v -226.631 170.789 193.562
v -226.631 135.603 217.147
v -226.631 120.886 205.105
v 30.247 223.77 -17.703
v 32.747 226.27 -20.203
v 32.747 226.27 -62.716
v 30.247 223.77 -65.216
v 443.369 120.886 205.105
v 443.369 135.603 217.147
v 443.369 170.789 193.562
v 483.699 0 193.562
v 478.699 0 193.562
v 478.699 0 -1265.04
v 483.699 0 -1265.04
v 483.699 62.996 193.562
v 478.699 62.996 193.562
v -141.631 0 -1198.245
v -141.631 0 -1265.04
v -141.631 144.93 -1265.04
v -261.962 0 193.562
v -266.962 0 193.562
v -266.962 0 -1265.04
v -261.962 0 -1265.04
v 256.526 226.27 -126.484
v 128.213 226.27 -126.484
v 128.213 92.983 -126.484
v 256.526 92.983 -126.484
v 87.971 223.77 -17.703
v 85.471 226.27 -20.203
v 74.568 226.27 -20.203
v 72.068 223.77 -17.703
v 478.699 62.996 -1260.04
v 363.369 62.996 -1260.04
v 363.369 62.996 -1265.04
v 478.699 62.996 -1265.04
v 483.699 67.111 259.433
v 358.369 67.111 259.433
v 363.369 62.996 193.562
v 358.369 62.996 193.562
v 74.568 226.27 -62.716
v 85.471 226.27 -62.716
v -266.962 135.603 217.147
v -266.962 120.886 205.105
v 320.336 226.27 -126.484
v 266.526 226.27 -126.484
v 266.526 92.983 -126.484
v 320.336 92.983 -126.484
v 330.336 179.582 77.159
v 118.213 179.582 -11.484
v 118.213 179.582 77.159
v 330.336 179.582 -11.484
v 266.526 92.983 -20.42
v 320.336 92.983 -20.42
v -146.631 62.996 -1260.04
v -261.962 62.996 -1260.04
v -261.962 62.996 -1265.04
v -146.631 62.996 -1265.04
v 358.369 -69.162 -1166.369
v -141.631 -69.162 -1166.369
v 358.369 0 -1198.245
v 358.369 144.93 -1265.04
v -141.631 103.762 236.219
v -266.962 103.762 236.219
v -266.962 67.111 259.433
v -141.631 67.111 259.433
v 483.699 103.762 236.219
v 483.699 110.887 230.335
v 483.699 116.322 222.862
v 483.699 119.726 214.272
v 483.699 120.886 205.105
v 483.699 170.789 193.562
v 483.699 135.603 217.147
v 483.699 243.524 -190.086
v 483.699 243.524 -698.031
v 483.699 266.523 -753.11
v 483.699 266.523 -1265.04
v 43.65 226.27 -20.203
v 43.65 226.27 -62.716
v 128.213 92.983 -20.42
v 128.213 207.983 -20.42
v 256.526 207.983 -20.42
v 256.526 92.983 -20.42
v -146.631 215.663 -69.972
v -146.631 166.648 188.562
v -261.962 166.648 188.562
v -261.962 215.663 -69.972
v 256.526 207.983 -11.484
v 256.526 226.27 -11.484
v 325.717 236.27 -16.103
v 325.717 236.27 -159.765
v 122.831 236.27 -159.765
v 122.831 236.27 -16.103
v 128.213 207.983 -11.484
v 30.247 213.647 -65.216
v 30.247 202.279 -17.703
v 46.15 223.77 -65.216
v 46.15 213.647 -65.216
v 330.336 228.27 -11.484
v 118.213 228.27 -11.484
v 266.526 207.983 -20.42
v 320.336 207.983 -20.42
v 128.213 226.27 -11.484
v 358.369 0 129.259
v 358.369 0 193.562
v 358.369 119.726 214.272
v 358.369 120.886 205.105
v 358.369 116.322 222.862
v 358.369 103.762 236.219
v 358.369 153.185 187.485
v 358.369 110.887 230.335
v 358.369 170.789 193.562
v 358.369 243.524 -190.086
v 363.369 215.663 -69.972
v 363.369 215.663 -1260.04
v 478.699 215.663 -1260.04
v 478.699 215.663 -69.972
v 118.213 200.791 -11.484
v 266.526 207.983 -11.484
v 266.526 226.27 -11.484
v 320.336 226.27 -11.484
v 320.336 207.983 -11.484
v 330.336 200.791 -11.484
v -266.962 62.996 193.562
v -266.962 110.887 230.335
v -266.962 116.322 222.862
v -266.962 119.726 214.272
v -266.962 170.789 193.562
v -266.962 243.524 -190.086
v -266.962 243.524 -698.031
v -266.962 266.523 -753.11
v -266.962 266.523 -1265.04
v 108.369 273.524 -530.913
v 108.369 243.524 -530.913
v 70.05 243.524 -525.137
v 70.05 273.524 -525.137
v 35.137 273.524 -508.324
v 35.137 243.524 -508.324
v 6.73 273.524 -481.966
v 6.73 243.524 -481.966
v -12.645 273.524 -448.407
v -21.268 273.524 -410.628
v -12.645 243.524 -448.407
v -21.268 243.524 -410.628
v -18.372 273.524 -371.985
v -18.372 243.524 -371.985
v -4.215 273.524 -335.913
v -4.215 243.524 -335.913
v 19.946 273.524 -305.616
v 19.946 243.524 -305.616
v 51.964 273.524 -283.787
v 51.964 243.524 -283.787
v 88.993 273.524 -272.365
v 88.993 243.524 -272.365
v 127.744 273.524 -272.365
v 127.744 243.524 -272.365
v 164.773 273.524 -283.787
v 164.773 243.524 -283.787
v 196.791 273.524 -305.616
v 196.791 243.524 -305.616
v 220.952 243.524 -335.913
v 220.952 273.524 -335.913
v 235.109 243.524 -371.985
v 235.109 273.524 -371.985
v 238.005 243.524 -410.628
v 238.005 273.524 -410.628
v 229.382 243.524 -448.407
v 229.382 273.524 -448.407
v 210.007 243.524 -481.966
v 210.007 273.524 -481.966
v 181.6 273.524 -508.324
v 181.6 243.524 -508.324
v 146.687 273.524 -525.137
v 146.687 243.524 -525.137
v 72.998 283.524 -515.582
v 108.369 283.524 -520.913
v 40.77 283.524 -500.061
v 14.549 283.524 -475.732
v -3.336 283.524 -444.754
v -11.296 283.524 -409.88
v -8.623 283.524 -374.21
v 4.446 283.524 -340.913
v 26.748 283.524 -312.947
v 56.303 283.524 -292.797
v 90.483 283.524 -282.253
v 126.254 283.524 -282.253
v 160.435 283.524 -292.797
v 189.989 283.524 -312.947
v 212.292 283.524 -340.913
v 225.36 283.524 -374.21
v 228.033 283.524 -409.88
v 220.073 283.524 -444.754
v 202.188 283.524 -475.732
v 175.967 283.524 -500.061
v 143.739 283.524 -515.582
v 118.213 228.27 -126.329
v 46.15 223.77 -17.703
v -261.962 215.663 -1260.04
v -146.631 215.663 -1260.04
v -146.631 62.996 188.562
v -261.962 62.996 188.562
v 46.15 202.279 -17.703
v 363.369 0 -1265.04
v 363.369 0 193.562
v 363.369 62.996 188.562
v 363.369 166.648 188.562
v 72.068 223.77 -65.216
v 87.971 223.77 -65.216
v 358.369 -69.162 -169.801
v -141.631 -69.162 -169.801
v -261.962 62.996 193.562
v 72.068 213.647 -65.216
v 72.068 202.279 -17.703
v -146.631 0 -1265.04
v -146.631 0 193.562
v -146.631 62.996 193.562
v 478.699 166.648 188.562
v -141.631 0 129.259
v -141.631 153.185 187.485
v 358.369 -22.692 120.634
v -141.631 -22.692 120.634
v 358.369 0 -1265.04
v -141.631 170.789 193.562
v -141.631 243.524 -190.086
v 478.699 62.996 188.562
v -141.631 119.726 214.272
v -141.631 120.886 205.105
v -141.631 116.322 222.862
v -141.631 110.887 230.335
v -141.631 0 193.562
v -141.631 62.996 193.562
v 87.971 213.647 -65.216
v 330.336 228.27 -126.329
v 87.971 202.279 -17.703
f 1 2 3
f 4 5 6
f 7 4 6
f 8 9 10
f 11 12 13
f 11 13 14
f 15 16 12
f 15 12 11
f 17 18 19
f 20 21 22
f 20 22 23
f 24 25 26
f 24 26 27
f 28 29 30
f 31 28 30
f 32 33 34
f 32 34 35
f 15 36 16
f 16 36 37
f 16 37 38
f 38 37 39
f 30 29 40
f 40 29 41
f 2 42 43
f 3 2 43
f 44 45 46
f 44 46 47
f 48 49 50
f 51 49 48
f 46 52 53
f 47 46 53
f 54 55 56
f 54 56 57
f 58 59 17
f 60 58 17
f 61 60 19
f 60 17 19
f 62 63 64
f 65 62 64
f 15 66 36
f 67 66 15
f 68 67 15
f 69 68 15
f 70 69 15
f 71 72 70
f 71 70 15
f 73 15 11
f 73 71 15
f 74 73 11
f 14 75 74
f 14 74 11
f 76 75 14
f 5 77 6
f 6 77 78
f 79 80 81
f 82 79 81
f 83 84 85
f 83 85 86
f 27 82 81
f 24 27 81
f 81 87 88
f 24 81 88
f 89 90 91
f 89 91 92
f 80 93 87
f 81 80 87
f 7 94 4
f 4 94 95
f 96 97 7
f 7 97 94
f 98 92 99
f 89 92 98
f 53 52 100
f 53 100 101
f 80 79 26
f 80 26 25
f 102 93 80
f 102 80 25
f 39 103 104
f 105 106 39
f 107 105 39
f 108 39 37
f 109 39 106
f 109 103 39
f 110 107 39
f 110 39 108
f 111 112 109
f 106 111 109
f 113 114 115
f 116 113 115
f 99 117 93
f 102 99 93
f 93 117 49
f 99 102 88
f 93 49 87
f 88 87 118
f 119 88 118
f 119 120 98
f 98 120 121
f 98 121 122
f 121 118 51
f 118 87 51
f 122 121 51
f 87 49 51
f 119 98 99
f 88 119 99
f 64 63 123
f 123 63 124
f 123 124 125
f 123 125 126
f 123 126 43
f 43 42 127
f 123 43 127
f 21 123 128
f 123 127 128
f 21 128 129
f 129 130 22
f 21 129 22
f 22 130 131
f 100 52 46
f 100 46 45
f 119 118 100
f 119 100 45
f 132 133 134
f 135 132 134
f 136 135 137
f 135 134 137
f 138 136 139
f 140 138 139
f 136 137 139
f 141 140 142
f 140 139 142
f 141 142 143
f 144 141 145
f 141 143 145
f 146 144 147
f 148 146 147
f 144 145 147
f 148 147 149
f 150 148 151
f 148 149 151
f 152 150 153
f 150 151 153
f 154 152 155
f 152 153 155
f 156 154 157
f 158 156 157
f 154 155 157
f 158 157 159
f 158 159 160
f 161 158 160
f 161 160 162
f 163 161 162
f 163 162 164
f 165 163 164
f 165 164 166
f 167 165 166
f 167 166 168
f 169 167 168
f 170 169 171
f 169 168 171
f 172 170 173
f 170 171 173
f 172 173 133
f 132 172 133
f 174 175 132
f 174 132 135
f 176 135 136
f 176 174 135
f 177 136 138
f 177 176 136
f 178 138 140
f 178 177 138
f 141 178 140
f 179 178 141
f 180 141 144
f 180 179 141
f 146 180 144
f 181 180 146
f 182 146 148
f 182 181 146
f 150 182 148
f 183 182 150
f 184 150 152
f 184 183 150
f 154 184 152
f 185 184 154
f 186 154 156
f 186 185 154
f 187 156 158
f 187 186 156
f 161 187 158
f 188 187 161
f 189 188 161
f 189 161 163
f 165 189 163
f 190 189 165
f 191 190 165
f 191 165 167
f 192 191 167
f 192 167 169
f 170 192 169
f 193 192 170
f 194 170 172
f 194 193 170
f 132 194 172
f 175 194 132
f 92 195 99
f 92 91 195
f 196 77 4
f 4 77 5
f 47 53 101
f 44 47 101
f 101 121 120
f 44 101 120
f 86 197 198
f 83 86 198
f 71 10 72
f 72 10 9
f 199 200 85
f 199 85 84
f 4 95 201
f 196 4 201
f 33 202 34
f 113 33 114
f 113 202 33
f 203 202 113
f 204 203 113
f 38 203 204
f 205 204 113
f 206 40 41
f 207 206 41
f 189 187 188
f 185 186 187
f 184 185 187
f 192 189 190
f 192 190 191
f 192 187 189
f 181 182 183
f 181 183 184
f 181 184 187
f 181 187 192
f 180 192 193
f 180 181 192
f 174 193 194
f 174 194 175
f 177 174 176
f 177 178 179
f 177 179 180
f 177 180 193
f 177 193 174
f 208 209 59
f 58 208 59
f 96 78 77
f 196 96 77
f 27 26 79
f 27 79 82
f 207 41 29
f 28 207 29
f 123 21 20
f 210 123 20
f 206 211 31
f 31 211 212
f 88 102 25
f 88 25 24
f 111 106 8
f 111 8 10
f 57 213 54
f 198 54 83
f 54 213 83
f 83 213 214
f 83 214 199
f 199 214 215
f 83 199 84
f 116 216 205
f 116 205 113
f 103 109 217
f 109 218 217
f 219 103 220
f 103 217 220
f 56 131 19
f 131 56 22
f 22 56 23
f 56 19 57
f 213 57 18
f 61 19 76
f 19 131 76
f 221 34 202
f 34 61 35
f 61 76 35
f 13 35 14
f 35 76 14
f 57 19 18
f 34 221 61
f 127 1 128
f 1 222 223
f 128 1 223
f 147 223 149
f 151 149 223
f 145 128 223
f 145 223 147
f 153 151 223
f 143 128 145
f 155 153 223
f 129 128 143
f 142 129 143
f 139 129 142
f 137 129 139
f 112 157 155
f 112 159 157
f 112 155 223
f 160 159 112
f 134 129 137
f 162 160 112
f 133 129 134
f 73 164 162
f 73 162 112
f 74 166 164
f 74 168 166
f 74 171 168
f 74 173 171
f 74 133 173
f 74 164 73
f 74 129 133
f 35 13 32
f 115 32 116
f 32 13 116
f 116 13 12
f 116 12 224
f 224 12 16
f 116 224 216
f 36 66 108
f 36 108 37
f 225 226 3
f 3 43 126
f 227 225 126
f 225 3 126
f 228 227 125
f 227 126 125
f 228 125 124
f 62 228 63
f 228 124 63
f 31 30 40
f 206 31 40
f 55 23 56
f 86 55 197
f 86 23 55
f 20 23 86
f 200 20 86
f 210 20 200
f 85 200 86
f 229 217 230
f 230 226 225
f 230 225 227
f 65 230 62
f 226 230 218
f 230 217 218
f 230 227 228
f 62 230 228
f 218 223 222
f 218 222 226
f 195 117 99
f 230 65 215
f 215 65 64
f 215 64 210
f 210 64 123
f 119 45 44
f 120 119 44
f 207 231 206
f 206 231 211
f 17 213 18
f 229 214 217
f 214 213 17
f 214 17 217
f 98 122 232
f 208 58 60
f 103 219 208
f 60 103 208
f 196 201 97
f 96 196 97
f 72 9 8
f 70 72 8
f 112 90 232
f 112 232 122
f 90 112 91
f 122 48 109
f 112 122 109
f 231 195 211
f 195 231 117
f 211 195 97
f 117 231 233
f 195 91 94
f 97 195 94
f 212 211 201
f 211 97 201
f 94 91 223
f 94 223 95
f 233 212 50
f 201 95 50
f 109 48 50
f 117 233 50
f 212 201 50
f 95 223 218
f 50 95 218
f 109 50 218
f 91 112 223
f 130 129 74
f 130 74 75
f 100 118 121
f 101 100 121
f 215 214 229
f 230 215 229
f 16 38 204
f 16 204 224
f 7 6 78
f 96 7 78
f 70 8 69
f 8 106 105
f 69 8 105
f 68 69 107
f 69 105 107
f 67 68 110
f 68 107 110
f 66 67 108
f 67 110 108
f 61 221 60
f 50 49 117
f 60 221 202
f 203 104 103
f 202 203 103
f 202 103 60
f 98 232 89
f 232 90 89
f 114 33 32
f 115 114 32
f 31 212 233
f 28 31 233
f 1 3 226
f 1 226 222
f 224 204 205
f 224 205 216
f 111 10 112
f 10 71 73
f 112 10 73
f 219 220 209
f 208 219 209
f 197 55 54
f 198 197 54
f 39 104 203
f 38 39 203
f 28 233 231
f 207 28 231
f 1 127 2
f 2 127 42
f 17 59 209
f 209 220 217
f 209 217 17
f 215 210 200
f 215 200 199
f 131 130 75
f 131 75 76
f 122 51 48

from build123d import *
from OCP.BRepAlgoAPI import BRepAlgoAPI_Cut
from OCP.TopTools import TopTools_ListOfShape
from OCP.BRepFilletAPI import BRepFilletAPI_MakeChamfer

# Parameters (mm, degrees)
BOSS_EXTRUDE1_DEPTH      = 193.56223071
BOSS_EXTRUDE1_DEPTH_BACK = 1265.039956588
SKETCH1_W                = 750.660133044
SKETCH1_H                = 349.862732427
SKETCH3_R                = 130
BOSS_EXTRUDE2_DEPTH      = 40
CUT_EXTRUDE1_DEPTH       = 1499.066357024
BOSS_EXTRUDE3_DEPTH      = 750.660133044
CHAMFER7_SIZE            = 10
BOSS_EXTRUDE4_DEPTH      = 750.660133044
CUT_EXTRUDE10_START      = -375.330067
CUT_EXTRUDE10_DEPTH      = 250
SKETCH22_W               = 125.330066522
SKETCH22_H               = 106.338336752
SKETCH22_W_2             = 115.330066522
SKETCH22_H_2             = 62.996013083
CUT_EXTRUDE11_DEPTH      = 1563.648643762
CUT_EXTRUDE12_REACH      = 1374.196
SKETCH24_W               = 115.330066522
SKETCH24_H               = 258.53466534
SKETCH25_W               = 115.330066522
SKETCH25_H               = 1190.067521958
CUT_EXTRUDE13_DEPTH      = 152.66709
BOSS_EXTRUDE5_REACH      = 1461.802
SKETCH27_W               = 212.123312066
SKETCH27_H               = 152.466183094
SKETCH28_W               = 148.280920275
SKETCH28_H               = 7.25471817
CUT_EXTRUDE14_DEPTH      = 212.123312065
SKETCH30_W               = 212.123312066
SKETCH30_H               = 21.209064542
CUT_EXTRUDE15_DEPTH      = 115
SKETCH31_W               = 128.313019002
SKETCH31_H               = 18.286786033
SKETCH31_W_2             = 53.810293064
CUT_EXTRUDE16_DEPTH      = 115
SKETCH32_W               = 128.313019002
SKETCH32_H               = 106.064247612
SKETCH32_W_2             = 53.810293064
CUT_EXTRUDE17_DEPTH      = 115
BOSS_EXTRUDE6_REACH      = 1500.066
CUT_EXTRUDE18_START      = -375.330067
CUT_EXTRUDE18_DEPTH      = 335
CHAMFER8_SIZE            = 8
CHAMFER8_SIZE2           = 4.618802154
BOSS_EXTRUDE7_REACH      = 1461.802
CHAMFER9_SIZE            = 2.5


with BuildPart() as part:
    # Sketch1 → Boss-Extrude1 (new, two sides: drawn at the far end of the back side and taken through both)
    with BuildSketch(Plane.XY.offset(-BOSS_EXTRUDE1_DEPTH_BACK)):
        with Locations((108.368558778, 68.593029462)):
            Rectangle(SKETCH1_W, SKETCH1_H)
    extrude(amount=BOSS_EXTRUDE1_DEPTH + BOSS_EXTRUDE1_DEPTH_BACK)

    # Sketch3 → Boss-Extrude2 (add)
    with BuildSketch(Plane(origin=(0, 243.524395675, 0), x_dir=(1, 0, 0), z_dir=(0, 1, 0))):
        with Locations(Location((108.368558778, 400.912813637, 0), (0, 0, 90))):
            Circle(SKETCH3_R)
    extrude(amount=BOSS_EXTRUDE2_DEPTH)

    # Sketch5 → Cut-Extrude1 (cut, through all)
    with BuildSketch(Plane(origin=(483.6986253, 0, 0), x_dir=(0, 0, -1), z_dir=(1, 0, 0))):
        Polygon((-193.56223071, 170.788945028), (190.086198144, 243.524395675), (-193.56223071, 243.524395675), align=None)
    extrude(amount=-CUT_EXTRUDE1_DEPTH, mode=Mode.SUBTRACT)

    # Sketch7 → Boss-Extrude3 (add)
    with BuildSketch(Plane(origin=(483.6986253, 0, 0), x_dir=(0, 0, -1), z_dir=(1, 0, 0))):
        Polygon((698.031406741, 243.524395675), (753.10995922, 266.522586582), (1265.039956588, 266.522586582), (1265.039956588, 243.524395675), align=None)
    extrude(amount=-BOSS_EXTRUDE3_DEPTH)

    # Chamfer7
    chamfer7_edges = [part.edges().sort_by_distance(p)[0] for p in [
        (108.368558778, 283.524395675, -270.912813637),
    ]]
    chamfer(chamfer7_edges, length=CHAMFER7_SIZE)

    # Sketch21 → Boss-Extrude4 (add)
    with BuildSketch(Plane.ZY.offset(266.961507744)):
        with BuildLine():
            Line((236.219336917, 103.762292304), (259.433344062, 67.111421995))
            Line((259.433344062, 67.111421995), (193.56223071, 62.996013083))
            Line((193.56223071, 62.996013083), (193.56223071, 120.885528527))
            Line((193.56223071, 120.885528527), (193.56223071, 170.788945028))
            Line((193.56223071, 170.788945028), (205.104812792, 120.885528527))
            ThreePointArc((205.104812792, 120.885528527), (222.862338171, 116.321994956), (236.219336917, 103.762292304))
        make_face()
    extrude(amount=-BOSS_EXTRUDE4_DEPTH)

    # Sketch20 → Cut-Extrude10 (cut, symmetric)
    with BuildSketch(Plane.ZY.offset(266.961507744).offset(CUT_EXTRUDE10_START)):
        Polygon((187.485453539, 153.18520382), (120.633916065, -22.69233968), (-169.800553019, -69.161854733), (-1166.369128547, -69.161854733), (-1265.039956588, 144.92983962), (-1265.039956588, -106.338336752), (316.242531376, -106.338336752), (316.242531376, 170.788945028), (193.56223071, 170.788945028), (-190.086198144, 243.524395675), align=None)
    extrude(amount=CUT_EXTRUDE10_DEPTH, both=True, mode=Mode.SUBTRACT)


with BuildPart() as cut_extrude11_tool:
    # Sketch22 → Cut-Extrude11 (new, through all)
    with BuildSketch(Plane.XY.offset(193.56223071)):
        with Locations((-204.296474483, -53.169168376)):
            Rectangle(SKETCH22_W, SKETCH22_H)
        with Locations((-204.296474483, 31.498006542)):
            Rectangle(SKETCH22_W_2, SKETCH22_H_2)
        with Locations((421.033592039, 31.498006542)):
            Rectangle(SKETCH22_W_2, SKETCH22_H_2)
        with Locations((421.033592039, -53.169168376)):
            Rectangle(SKETCH22_W, SKETCH22_H)
    extrude(amount=-CUT_EXTRUDE11_DEPTH)


with BuildPart() as part_1:
    add(part.part)

    # Cut-Extrude11: cut by cut_extrude11_tool, with a tolerance
    cut_extrude11_stock = TopTools_ListOfShape()
    cut_extrude11_stock.Append(part_1.part.wrapped)
    cut_extrude11_tools = TopTools_ListOfShape()
    cut_extrude11_tools.Append(cut_extrude11_tool.part.wrapped)
    cut_extrude11_cut = BRepAlgoAPI_Cut()
    cut_extrude11_cut.SetArguments(cut_extrude11_stock)
    cut_extrude11_cut.SetTools(cut_extrude11_tools)
    cut_extrude11_cut.SetFuzzyValue(0.00001)
    cut_extrude11_cut.Build()
    add(Compound.cast(cut_extrude11_cut.Shape()).solids(), mode=Mode.REPLACE)

    # Cut-Extrude12: up to this plane
    cut_extrude12_end = Plane(origin=(-266.961507744, 165.876452738, 192.630877123), z_dir=(0, -0.9824984579201473, -0.18627071746394425))
    # Sketch24 → Cut-Extrude12 (cut, up to the surface)
    with BuildSketch(Plane.XZ.offset(-62.996013083), mode=Mode.PRIVATE) as cut_extrude12_sk1:
        with Locations((-204.296474483, 59.29489804)):
            Rectangle(SKETCH24_W, SKETCH24_H)
    cut_extrude12_tool1 = split(extrude(cut_extrude12_sk1.sketch, amount=-CUT_EXTRUDE12_REACH, mode=Mode.PRIVATE), bisect_by=cut_extrude12_end, keep=Keep.BOTH, mode=Mode.PRIVATE)
    add(cut_extrude12_tool1.solids().sort_by_distance((-204.296474, 62.996013, 59.294898))[0], mode=Mode.SUBTRACT)
    # Sketch24 → Cut-Extrude12 (cut, up to the surface)
    with BuildSketch(Plane.XZ.offset(-62.996013083), mode=Mode.PRIVATE) as cut_extrude12_sk2:
        with Locations((421.033592039, 59.29489804)):
            Rectangle(SKETCH24_W, SKETCH24_H)
    cut_extrude12_tool2 = split(extrude(cut_extrude12_sk2.sketch, amount=-CUT_EXTRUDE12_REACH, mode=Mode.PRIVATE), bisect_by=cut_extrude12_end, keep=Keep.BOTH, mode=Mode.PRIVATE)
    add(cut_extrude12_tool2.solids().sort_by_distance((421.033592, 62.996013, 59.294898))[0], mode=Mode.SUBTRACT)

    # Sketch25 → Cut-Extrude13 (cut)
    with BuildSketch(Plane.XZ.offset(-62.996013083)):
        with Locations((-204.296474483, -665.006195609)):
            Rectangle(SKETCH25_W, SKETCH25_H)
        with Locations((421.033592039, -665.006195609)):
            Rectangle(SKETCH25_W, SKETCH25_H)
    extrude(amount=-CUT_EXTRUDE13_DEPTH, mode=Mode.SUBTRACT)

    # Boss-Extrude5: up to this plane
    boss_extrude5_end = Plane(origin=(-266.961507744, 243.524395675, 193.56223071), z_dir=(0, -1, 0))
    # Sketch27 → Boss-Extrude5 (add, up to the surface)
    with BuildSketch(Plane(origin=(0, 187.320129902, 44.818908088), x_dir=(1, 0, 0), z_dir=(0, 0.9725495665123397, 0.2326958114721023)), mode=Mode.PRIVATE) as boss_extrude5_sk1:
        with Locations((224.274258106, 134.125433145)):
            Rectangle(SKETCH27_W, SKETCH27_H)
    boss_extrude5_tool1 = split(extrude(boss_extrude5_sk1.sketch, amount=BOSS_EXTRUDE5_REACH, dir=(0, 1, 0), mode=Mode.PRIVATE), bisect_by=boss_extrude5_end, keep=Keep.BOTH, mode=Mode.PRIVATE)
    add(boss_extrude5_tool1.solids().sort_by_distance((224.274258, 218.530556, -85.624724))[0])

    # Sketch28 → Cut-Extrude14 (cut)
    with BuildSketch(Plane.ZY.offset(-118.212602073)):
        with Locations((-85.624723776, 239.89703659)):
            Rectangle(SKETCH28_W, SKETCH28_H)
    extrude(amount=-CUT_EXTRUDE14_DEPTH, mode=Mode.SUBTRACT)

    # Sketch30 → Cut-Extrude15 (cut)
    with BuildSketch(Plane.XY.offset(-11.484263638)):
        with Locations((224.274258106, 190.186903037)):
            Rectangle(SKETCH30_W, SKETCH30_H)
    extrude(amount=CUT_EXTRUDE15_DEPTH, mode=Mode.SUBTRACT)

    # Sketch31 → Cut-Extrude16 (cut)
    with BuildSketch(Plane.XY.offset(-11.484263638)):
        with Locations((192.369111574, 217.126284489)):
            Rectangle(SKETCH31_W, SKETCH31_H)
        with Locations((293.430767607, 217.126284489)):
            Rectangle(SKETCH31_W_2, SKETCH31_H)
    extrude(amount=-CUT_EXTRUDE16_DEPTH, mode=Mode.SUBTRACT)

    # Sketch32 → Cut-Extrude17 (cut)
    with BuildSketch(Plane(origin=(0, 207.982891472, 0), x_dir=(1, 0, 0), z_dir=(0, 1, 0))):
        with Locations((192.369111574, 73.452139832)):
            Rectangle(SKETCH32_W, SKETCH32_H)
        with Locations((293.430767607, 73.452139832)):
            Rectangle(SKETCH32_W_2, SKETCH32_H)
    extrude(amount=-CUT_EXTRUDE17_DEPTH, mode=Mode.SUBTRACT)

    # Boss-Extrude6: up to this face of the body (flat: up to its plane)
    boss_extrude6_end = Plane(part_1.part.faces().sort_by_distance((483.6986253, 122.340997746, -568.947125817))[0])
    # Sketch34 → Boss-Extrude6 (add, up to the picked face)
    with BuildSketch(Plane.ZY.offset(266.961507744), mode=Mode.PRIVATE) as boss_extrude6_sk1:
        Polygon((193.56223071, 170.788945028), (217.146727568, 135.603005806), (205.104812792, 120.885528527), align=None)
    boss_extrude6_tool1 = split(extrude(boss_extrude6_sk1.sketch, amount=-BOSS_EXTRUDE6_REACH, mode=Mode.PRIVATE), bisect_by=boss_extrude6_end, keep=Keep.BOTH, mode=Mode.PRIVATE)
    add(boss_extrude6_tool1.solids().sort_by(Axis((-266.961508, 142.425826, 205.271257), (1, 0, 0)))[0])

    # Sketch35 → Cut-Extrude18 (cut, symmetric)
    with BuildSketch(Plane.ZY.offset(266.961507744).offset(CUT_EXTRUDE18_START)):
        Polygon((205.104812792, 120.885528527), (193.56223071, 170.788945028), (217.146727568, 135.603005806), align=None)
    extrude(amount=CUT_EXTRUDE18_DEPTH, both=True, mode=Mode.SUBTRACT)

    # Chamfer8: one chamfer whose edges measure the first distance from different faces: ONE call of the kernel's chamfer builder (chamfer() names one face for all edges)
    chamfer8_edges_1 = [part_1.edges().sort_by_distance(p)[0] for p in [
        (224.274258106, 236.269677505, -11.484263638),
    ]]
    chamfer8_side_1 = [part_1.faces().sort_by_distance(p)[0] for p in [
        (225.057773378, 204.40173967, -11.484263638),
    ]]
    chamfer8_edges_2 = [part_1.edges().sort_by_distance(p)[0] for p in [
        (118.212602073, 236.269677505, -85.624723775),
    ]]
    chamfer8_side_2 = [part_1.faces().sort_by_distance(p)[0] for p in [
        (118.212602073, 224.443596773, -60.911237063),
    ]]
    chamfer8_edges_3 = [part_1.edges().sort_by_distance(p)[0] for p in [
        (330.335914138, 236.269677505, -85.624723775),
    ]]
    chamfer8_side_3 = [part_1.faces().sort_by_distance(p)[0] for p in [
        (330.335914139, 224.443596773, -60.911237063),
    ]]
    chamfer8 = BRepFilletAPI_MakeChamfer(part_1.part.solid().wrapped)
    for e in chamfer8_edges_1:
        chamfer8.Add(CHAMFER8_SIZE, CHAMFER8_SIZE2, e.wrapped, chamfer8_side_1[0].wrapped)  # the first distance lies on this face
    for e in chamfer8_edges_2:
        chamfer8.Add(CHAMFER8_SIZE, CHAMFER8_SIZE2, e.wrapped, chamfer8_side_2[0].wrapped)  # the first distance lies on this face
    for e in chamfer8_edges_3:
        chamfer8.Add(CHAMFER8_SIZE, CHAMFER8_SIZE2, e.wrapped, chamfer8_side_3[0].wrapped)  # the first distance lies on this face
    add(Compound.cast(chamfer8.Shape()), mode=Mode.REPLACE)

    # Boss-Extrude7: up to this plane
    boss_extrude7_end = Plane(origin=(478.794198695, 226.269677505, -159.765183913), z_dir=(0, -1, 0))
    # Sketch36 → Boss-Extrude7 (add, up to the surface)
    with BuildSketch(Plane(origin=(0, 187.320129902, 44.818908088), x_dir=(1, 0, 0), z_dir=(0, 0.9725495665123397, 0.2326958114721023)), mode=Mode.PRIVATE) as boss_extrude7_sk1:
        Polygon((72.068248118, 64.286413464), (87.971069757, 64.286413464), (87.971069757, 113.140659417), (72.068248118, 113.140659417), (72.068248118, 96.084936844), align=None)
    boss_extrude7_tool1 = split(extrude(boss_extrude7_sk1.sketch, amount=BOSS_EXTRUDE7_REACH, dir=(0, 1, 0), mode=Mode.PRIVATE), bisect_by=boss_extrude7_end, keep=Keep.BOTH, mode=Mode.PRIVATE)
    add(boss_extrude7_tool1.solids().sort_by_distance((80.019659, 207.963398, -41.459403))[0])
    # Sketch36 → Boss-Extrude7 (add, up to the surface)
    with BuildSketch(Plane(origin=(0, 187.320129902, 44.818908088), x_dir=(1, 0, 0), z_dir=(0, 0.9725495665123397, 0.2326958114721023)), mode=Mode.PRIVATE) as boss_extrude7_sk2:
        Polygon((30.247215503, 64.286413464), (46.150037141, 64.286413464), (46.150037141, 96.084936844), (46.150037141, 113.140659417), (30.247215503, 113.140659417), align=None)
    boss_extrude7_tool2 = split(extrude(boss_extrude7_sk2.sketch, amount=BOSS_EXTRUDE7_REACH, dir=(0, 1, 0), mode=Mode.PRIVATE), bisect_by=boss_extrude7_end, keep=Keep.BOTH, mode=Mode.PRIVATE)
    add(boss_extrude7_tool2.solids().sort_by_distance((38.198626, 207.963398, -41.459403))[0])

    # Chamfer9
    chamfer9_edges = [part_1.edges().sort_by_distance(p)[0] for p in [
        (80.019658938, 226.269677505, -65.215991183),
        (87.971069757, 226.269677505, -41.459403321),
        (72.068248118, 226.269677505, -41.459403321),
        (80.019658938, 226.269677505, -17.702815459),
        (38.198626322, 226.269677505, -65.215991183),
        (46.150037141, 226.269677505, -41.459403321),
        (30.247215503, 226.269677505, -41.459403321),
        (38.198626322, 226.269677505, -17.702815459),
    ]]
    chamfer(chamfer9_edges, length=CHAMFER9_SIZE)


solid = part_1.part
